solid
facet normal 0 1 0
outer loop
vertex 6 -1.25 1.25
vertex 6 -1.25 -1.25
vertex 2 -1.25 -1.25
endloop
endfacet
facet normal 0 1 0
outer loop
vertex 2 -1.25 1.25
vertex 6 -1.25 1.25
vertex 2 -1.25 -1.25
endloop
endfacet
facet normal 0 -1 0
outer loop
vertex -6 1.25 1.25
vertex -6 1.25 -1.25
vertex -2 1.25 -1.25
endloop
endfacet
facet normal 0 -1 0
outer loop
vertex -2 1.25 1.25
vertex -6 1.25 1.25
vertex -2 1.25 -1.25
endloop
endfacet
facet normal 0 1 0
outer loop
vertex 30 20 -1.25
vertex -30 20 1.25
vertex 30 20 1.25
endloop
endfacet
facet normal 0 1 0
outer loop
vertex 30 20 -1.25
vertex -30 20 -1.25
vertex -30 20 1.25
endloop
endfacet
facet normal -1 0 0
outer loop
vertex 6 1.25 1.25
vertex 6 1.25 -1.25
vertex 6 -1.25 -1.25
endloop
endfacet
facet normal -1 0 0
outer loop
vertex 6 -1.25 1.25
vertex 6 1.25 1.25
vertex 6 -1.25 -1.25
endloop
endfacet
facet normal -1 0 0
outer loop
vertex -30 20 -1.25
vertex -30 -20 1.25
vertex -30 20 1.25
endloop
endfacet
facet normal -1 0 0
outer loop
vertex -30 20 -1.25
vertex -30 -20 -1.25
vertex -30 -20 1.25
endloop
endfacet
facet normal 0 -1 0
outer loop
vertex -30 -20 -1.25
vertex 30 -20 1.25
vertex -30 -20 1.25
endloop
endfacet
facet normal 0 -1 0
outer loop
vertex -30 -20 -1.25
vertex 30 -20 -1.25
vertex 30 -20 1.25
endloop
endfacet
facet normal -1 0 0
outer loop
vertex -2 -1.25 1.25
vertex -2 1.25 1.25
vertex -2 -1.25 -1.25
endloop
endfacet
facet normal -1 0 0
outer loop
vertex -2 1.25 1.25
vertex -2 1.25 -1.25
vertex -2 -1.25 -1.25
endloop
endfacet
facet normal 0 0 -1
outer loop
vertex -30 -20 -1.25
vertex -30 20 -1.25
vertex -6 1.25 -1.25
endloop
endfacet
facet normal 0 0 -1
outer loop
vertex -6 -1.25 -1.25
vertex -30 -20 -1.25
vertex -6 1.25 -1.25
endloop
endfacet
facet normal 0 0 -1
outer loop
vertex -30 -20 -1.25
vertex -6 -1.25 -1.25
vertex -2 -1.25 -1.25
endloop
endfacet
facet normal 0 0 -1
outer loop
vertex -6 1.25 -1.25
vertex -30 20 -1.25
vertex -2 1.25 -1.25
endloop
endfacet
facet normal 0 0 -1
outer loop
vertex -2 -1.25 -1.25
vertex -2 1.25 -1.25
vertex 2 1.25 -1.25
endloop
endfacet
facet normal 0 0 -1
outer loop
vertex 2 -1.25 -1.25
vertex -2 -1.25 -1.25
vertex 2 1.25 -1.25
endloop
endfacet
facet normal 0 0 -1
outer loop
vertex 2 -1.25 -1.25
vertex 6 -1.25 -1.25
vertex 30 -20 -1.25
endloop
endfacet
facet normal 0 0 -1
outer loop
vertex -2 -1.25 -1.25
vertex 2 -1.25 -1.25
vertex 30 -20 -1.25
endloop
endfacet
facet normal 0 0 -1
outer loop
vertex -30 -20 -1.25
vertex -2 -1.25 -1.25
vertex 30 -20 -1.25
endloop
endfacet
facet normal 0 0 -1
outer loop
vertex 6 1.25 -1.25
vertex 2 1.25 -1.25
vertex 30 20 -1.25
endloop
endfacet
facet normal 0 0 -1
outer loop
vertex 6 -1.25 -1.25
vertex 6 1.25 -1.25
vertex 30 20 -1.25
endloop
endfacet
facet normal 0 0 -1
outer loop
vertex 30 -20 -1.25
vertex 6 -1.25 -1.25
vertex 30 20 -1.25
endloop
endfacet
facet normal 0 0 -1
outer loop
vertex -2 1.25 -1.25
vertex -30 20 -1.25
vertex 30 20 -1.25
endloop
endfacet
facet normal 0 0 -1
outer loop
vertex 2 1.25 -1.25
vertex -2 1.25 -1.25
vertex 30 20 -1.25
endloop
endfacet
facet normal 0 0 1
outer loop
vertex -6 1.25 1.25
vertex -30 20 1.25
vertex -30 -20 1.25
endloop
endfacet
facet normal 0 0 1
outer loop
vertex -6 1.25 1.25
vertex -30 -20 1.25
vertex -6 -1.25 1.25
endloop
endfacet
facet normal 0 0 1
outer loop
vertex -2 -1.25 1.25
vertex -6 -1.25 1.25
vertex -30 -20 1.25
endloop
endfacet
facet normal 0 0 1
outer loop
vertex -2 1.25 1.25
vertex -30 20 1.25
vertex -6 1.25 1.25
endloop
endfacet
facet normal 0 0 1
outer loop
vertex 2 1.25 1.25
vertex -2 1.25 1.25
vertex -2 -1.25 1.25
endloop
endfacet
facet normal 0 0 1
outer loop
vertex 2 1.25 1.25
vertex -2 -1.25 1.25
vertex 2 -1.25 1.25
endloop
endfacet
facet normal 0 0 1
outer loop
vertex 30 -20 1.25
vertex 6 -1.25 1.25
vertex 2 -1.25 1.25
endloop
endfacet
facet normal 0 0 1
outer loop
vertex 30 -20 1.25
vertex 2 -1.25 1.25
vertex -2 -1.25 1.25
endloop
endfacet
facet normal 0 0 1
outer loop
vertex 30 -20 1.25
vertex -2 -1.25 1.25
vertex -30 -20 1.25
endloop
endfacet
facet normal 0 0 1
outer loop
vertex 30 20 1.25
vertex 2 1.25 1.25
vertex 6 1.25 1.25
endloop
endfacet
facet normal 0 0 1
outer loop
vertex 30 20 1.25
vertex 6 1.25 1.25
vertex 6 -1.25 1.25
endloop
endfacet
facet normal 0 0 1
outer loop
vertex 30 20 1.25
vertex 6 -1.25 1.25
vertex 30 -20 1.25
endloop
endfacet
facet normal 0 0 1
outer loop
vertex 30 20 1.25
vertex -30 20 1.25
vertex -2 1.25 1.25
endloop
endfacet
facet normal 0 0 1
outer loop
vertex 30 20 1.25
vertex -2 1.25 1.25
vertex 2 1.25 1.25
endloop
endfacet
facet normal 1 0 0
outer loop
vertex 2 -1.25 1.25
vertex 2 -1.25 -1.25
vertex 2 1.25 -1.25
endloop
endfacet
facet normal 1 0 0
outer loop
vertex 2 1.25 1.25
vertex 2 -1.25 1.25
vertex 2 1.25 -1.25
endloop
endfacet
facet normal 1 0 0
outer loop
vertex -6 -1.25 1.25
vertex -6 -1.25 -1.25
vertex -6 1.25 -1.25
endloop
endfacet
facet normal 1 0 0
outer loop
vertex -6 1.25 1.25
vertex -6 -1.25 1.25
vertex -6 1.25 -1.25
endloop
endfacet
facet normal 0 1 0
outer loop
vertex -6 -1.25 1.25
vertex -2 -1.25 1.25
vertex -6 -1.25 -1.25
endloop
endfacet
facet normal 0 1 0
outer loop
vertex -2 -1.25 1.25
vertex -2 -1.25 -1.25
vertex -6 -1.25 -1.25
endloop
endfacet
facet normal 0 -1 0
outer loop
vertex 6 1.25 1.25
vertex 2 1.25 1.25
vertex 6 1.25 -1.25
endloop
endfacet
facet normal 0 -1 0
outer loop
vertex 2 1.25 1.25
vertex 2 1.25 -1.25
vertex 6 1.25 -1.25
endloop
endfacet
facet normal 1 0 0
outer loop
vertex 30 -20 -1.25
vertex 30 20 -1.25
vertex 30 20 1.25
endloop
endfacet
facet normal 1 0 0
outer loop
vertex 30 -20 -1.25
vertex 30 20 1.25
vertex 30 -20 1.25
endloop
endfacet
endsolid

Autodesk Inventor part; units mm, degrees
ref_plane "YZ Plane" through (0, 0, 0) normal (1, 0, 0) x (0, 1, 0)
ref_plane "XZ Plane" through (0, 0, 0) normal (0, 1, 0) x (-1, 0, 0)
ref_plane "XY Plane" through (0, 0, 0) normal (0, 0, 1) x (1, 0, 0)
sketch "Sketch1" plane through (0, 0, 0) normal (0, 0, 1) x (1, 0, 0)
  line L0 (0, 8.7149) -> (0, -8.7149) construction
  line L1 (-12.4402, 0) -> (12.4402, 0) construction
  line L2 (-30, 20) -> (30, 20)
  line L3 (30, 20) -> (30, -20)
  line L4 (30, -20) -> (-30, -20)
  line L5 (-30, -20) -> (-30, 20)
  line L6 (-6, 1.25) -> (-2, 1.25)
  line L7 (-2, 1.25) -> (-2, -1.25)
  line L8 (-2, -1.25) -> (-6, -1.25)
  line L9 (-6, -1.25) -> (-6, 1.25)
  line L10 (2, 1.25) -> (6, 1.25)
  line L11 (6, 1.25) -> (6, -1.25)
  line L12 (6, -1.25) -> (2, -1.25)
  line L13 (2, -1.25) -> (2, 1.25)
  point P0 (0, 0)
  point P1 (0, 0)
  dimension "d0" = 4
  dimension "d1" = 4
  dimension "d2" = 4
  dimension "d3" = 2.5
  dimension "d4" = 40
  dimension "d5" = 60
extrude "Extrusion1" add sketch "Sketch1" along normal mid plane 2.5
properties part number "pitahaya3"
